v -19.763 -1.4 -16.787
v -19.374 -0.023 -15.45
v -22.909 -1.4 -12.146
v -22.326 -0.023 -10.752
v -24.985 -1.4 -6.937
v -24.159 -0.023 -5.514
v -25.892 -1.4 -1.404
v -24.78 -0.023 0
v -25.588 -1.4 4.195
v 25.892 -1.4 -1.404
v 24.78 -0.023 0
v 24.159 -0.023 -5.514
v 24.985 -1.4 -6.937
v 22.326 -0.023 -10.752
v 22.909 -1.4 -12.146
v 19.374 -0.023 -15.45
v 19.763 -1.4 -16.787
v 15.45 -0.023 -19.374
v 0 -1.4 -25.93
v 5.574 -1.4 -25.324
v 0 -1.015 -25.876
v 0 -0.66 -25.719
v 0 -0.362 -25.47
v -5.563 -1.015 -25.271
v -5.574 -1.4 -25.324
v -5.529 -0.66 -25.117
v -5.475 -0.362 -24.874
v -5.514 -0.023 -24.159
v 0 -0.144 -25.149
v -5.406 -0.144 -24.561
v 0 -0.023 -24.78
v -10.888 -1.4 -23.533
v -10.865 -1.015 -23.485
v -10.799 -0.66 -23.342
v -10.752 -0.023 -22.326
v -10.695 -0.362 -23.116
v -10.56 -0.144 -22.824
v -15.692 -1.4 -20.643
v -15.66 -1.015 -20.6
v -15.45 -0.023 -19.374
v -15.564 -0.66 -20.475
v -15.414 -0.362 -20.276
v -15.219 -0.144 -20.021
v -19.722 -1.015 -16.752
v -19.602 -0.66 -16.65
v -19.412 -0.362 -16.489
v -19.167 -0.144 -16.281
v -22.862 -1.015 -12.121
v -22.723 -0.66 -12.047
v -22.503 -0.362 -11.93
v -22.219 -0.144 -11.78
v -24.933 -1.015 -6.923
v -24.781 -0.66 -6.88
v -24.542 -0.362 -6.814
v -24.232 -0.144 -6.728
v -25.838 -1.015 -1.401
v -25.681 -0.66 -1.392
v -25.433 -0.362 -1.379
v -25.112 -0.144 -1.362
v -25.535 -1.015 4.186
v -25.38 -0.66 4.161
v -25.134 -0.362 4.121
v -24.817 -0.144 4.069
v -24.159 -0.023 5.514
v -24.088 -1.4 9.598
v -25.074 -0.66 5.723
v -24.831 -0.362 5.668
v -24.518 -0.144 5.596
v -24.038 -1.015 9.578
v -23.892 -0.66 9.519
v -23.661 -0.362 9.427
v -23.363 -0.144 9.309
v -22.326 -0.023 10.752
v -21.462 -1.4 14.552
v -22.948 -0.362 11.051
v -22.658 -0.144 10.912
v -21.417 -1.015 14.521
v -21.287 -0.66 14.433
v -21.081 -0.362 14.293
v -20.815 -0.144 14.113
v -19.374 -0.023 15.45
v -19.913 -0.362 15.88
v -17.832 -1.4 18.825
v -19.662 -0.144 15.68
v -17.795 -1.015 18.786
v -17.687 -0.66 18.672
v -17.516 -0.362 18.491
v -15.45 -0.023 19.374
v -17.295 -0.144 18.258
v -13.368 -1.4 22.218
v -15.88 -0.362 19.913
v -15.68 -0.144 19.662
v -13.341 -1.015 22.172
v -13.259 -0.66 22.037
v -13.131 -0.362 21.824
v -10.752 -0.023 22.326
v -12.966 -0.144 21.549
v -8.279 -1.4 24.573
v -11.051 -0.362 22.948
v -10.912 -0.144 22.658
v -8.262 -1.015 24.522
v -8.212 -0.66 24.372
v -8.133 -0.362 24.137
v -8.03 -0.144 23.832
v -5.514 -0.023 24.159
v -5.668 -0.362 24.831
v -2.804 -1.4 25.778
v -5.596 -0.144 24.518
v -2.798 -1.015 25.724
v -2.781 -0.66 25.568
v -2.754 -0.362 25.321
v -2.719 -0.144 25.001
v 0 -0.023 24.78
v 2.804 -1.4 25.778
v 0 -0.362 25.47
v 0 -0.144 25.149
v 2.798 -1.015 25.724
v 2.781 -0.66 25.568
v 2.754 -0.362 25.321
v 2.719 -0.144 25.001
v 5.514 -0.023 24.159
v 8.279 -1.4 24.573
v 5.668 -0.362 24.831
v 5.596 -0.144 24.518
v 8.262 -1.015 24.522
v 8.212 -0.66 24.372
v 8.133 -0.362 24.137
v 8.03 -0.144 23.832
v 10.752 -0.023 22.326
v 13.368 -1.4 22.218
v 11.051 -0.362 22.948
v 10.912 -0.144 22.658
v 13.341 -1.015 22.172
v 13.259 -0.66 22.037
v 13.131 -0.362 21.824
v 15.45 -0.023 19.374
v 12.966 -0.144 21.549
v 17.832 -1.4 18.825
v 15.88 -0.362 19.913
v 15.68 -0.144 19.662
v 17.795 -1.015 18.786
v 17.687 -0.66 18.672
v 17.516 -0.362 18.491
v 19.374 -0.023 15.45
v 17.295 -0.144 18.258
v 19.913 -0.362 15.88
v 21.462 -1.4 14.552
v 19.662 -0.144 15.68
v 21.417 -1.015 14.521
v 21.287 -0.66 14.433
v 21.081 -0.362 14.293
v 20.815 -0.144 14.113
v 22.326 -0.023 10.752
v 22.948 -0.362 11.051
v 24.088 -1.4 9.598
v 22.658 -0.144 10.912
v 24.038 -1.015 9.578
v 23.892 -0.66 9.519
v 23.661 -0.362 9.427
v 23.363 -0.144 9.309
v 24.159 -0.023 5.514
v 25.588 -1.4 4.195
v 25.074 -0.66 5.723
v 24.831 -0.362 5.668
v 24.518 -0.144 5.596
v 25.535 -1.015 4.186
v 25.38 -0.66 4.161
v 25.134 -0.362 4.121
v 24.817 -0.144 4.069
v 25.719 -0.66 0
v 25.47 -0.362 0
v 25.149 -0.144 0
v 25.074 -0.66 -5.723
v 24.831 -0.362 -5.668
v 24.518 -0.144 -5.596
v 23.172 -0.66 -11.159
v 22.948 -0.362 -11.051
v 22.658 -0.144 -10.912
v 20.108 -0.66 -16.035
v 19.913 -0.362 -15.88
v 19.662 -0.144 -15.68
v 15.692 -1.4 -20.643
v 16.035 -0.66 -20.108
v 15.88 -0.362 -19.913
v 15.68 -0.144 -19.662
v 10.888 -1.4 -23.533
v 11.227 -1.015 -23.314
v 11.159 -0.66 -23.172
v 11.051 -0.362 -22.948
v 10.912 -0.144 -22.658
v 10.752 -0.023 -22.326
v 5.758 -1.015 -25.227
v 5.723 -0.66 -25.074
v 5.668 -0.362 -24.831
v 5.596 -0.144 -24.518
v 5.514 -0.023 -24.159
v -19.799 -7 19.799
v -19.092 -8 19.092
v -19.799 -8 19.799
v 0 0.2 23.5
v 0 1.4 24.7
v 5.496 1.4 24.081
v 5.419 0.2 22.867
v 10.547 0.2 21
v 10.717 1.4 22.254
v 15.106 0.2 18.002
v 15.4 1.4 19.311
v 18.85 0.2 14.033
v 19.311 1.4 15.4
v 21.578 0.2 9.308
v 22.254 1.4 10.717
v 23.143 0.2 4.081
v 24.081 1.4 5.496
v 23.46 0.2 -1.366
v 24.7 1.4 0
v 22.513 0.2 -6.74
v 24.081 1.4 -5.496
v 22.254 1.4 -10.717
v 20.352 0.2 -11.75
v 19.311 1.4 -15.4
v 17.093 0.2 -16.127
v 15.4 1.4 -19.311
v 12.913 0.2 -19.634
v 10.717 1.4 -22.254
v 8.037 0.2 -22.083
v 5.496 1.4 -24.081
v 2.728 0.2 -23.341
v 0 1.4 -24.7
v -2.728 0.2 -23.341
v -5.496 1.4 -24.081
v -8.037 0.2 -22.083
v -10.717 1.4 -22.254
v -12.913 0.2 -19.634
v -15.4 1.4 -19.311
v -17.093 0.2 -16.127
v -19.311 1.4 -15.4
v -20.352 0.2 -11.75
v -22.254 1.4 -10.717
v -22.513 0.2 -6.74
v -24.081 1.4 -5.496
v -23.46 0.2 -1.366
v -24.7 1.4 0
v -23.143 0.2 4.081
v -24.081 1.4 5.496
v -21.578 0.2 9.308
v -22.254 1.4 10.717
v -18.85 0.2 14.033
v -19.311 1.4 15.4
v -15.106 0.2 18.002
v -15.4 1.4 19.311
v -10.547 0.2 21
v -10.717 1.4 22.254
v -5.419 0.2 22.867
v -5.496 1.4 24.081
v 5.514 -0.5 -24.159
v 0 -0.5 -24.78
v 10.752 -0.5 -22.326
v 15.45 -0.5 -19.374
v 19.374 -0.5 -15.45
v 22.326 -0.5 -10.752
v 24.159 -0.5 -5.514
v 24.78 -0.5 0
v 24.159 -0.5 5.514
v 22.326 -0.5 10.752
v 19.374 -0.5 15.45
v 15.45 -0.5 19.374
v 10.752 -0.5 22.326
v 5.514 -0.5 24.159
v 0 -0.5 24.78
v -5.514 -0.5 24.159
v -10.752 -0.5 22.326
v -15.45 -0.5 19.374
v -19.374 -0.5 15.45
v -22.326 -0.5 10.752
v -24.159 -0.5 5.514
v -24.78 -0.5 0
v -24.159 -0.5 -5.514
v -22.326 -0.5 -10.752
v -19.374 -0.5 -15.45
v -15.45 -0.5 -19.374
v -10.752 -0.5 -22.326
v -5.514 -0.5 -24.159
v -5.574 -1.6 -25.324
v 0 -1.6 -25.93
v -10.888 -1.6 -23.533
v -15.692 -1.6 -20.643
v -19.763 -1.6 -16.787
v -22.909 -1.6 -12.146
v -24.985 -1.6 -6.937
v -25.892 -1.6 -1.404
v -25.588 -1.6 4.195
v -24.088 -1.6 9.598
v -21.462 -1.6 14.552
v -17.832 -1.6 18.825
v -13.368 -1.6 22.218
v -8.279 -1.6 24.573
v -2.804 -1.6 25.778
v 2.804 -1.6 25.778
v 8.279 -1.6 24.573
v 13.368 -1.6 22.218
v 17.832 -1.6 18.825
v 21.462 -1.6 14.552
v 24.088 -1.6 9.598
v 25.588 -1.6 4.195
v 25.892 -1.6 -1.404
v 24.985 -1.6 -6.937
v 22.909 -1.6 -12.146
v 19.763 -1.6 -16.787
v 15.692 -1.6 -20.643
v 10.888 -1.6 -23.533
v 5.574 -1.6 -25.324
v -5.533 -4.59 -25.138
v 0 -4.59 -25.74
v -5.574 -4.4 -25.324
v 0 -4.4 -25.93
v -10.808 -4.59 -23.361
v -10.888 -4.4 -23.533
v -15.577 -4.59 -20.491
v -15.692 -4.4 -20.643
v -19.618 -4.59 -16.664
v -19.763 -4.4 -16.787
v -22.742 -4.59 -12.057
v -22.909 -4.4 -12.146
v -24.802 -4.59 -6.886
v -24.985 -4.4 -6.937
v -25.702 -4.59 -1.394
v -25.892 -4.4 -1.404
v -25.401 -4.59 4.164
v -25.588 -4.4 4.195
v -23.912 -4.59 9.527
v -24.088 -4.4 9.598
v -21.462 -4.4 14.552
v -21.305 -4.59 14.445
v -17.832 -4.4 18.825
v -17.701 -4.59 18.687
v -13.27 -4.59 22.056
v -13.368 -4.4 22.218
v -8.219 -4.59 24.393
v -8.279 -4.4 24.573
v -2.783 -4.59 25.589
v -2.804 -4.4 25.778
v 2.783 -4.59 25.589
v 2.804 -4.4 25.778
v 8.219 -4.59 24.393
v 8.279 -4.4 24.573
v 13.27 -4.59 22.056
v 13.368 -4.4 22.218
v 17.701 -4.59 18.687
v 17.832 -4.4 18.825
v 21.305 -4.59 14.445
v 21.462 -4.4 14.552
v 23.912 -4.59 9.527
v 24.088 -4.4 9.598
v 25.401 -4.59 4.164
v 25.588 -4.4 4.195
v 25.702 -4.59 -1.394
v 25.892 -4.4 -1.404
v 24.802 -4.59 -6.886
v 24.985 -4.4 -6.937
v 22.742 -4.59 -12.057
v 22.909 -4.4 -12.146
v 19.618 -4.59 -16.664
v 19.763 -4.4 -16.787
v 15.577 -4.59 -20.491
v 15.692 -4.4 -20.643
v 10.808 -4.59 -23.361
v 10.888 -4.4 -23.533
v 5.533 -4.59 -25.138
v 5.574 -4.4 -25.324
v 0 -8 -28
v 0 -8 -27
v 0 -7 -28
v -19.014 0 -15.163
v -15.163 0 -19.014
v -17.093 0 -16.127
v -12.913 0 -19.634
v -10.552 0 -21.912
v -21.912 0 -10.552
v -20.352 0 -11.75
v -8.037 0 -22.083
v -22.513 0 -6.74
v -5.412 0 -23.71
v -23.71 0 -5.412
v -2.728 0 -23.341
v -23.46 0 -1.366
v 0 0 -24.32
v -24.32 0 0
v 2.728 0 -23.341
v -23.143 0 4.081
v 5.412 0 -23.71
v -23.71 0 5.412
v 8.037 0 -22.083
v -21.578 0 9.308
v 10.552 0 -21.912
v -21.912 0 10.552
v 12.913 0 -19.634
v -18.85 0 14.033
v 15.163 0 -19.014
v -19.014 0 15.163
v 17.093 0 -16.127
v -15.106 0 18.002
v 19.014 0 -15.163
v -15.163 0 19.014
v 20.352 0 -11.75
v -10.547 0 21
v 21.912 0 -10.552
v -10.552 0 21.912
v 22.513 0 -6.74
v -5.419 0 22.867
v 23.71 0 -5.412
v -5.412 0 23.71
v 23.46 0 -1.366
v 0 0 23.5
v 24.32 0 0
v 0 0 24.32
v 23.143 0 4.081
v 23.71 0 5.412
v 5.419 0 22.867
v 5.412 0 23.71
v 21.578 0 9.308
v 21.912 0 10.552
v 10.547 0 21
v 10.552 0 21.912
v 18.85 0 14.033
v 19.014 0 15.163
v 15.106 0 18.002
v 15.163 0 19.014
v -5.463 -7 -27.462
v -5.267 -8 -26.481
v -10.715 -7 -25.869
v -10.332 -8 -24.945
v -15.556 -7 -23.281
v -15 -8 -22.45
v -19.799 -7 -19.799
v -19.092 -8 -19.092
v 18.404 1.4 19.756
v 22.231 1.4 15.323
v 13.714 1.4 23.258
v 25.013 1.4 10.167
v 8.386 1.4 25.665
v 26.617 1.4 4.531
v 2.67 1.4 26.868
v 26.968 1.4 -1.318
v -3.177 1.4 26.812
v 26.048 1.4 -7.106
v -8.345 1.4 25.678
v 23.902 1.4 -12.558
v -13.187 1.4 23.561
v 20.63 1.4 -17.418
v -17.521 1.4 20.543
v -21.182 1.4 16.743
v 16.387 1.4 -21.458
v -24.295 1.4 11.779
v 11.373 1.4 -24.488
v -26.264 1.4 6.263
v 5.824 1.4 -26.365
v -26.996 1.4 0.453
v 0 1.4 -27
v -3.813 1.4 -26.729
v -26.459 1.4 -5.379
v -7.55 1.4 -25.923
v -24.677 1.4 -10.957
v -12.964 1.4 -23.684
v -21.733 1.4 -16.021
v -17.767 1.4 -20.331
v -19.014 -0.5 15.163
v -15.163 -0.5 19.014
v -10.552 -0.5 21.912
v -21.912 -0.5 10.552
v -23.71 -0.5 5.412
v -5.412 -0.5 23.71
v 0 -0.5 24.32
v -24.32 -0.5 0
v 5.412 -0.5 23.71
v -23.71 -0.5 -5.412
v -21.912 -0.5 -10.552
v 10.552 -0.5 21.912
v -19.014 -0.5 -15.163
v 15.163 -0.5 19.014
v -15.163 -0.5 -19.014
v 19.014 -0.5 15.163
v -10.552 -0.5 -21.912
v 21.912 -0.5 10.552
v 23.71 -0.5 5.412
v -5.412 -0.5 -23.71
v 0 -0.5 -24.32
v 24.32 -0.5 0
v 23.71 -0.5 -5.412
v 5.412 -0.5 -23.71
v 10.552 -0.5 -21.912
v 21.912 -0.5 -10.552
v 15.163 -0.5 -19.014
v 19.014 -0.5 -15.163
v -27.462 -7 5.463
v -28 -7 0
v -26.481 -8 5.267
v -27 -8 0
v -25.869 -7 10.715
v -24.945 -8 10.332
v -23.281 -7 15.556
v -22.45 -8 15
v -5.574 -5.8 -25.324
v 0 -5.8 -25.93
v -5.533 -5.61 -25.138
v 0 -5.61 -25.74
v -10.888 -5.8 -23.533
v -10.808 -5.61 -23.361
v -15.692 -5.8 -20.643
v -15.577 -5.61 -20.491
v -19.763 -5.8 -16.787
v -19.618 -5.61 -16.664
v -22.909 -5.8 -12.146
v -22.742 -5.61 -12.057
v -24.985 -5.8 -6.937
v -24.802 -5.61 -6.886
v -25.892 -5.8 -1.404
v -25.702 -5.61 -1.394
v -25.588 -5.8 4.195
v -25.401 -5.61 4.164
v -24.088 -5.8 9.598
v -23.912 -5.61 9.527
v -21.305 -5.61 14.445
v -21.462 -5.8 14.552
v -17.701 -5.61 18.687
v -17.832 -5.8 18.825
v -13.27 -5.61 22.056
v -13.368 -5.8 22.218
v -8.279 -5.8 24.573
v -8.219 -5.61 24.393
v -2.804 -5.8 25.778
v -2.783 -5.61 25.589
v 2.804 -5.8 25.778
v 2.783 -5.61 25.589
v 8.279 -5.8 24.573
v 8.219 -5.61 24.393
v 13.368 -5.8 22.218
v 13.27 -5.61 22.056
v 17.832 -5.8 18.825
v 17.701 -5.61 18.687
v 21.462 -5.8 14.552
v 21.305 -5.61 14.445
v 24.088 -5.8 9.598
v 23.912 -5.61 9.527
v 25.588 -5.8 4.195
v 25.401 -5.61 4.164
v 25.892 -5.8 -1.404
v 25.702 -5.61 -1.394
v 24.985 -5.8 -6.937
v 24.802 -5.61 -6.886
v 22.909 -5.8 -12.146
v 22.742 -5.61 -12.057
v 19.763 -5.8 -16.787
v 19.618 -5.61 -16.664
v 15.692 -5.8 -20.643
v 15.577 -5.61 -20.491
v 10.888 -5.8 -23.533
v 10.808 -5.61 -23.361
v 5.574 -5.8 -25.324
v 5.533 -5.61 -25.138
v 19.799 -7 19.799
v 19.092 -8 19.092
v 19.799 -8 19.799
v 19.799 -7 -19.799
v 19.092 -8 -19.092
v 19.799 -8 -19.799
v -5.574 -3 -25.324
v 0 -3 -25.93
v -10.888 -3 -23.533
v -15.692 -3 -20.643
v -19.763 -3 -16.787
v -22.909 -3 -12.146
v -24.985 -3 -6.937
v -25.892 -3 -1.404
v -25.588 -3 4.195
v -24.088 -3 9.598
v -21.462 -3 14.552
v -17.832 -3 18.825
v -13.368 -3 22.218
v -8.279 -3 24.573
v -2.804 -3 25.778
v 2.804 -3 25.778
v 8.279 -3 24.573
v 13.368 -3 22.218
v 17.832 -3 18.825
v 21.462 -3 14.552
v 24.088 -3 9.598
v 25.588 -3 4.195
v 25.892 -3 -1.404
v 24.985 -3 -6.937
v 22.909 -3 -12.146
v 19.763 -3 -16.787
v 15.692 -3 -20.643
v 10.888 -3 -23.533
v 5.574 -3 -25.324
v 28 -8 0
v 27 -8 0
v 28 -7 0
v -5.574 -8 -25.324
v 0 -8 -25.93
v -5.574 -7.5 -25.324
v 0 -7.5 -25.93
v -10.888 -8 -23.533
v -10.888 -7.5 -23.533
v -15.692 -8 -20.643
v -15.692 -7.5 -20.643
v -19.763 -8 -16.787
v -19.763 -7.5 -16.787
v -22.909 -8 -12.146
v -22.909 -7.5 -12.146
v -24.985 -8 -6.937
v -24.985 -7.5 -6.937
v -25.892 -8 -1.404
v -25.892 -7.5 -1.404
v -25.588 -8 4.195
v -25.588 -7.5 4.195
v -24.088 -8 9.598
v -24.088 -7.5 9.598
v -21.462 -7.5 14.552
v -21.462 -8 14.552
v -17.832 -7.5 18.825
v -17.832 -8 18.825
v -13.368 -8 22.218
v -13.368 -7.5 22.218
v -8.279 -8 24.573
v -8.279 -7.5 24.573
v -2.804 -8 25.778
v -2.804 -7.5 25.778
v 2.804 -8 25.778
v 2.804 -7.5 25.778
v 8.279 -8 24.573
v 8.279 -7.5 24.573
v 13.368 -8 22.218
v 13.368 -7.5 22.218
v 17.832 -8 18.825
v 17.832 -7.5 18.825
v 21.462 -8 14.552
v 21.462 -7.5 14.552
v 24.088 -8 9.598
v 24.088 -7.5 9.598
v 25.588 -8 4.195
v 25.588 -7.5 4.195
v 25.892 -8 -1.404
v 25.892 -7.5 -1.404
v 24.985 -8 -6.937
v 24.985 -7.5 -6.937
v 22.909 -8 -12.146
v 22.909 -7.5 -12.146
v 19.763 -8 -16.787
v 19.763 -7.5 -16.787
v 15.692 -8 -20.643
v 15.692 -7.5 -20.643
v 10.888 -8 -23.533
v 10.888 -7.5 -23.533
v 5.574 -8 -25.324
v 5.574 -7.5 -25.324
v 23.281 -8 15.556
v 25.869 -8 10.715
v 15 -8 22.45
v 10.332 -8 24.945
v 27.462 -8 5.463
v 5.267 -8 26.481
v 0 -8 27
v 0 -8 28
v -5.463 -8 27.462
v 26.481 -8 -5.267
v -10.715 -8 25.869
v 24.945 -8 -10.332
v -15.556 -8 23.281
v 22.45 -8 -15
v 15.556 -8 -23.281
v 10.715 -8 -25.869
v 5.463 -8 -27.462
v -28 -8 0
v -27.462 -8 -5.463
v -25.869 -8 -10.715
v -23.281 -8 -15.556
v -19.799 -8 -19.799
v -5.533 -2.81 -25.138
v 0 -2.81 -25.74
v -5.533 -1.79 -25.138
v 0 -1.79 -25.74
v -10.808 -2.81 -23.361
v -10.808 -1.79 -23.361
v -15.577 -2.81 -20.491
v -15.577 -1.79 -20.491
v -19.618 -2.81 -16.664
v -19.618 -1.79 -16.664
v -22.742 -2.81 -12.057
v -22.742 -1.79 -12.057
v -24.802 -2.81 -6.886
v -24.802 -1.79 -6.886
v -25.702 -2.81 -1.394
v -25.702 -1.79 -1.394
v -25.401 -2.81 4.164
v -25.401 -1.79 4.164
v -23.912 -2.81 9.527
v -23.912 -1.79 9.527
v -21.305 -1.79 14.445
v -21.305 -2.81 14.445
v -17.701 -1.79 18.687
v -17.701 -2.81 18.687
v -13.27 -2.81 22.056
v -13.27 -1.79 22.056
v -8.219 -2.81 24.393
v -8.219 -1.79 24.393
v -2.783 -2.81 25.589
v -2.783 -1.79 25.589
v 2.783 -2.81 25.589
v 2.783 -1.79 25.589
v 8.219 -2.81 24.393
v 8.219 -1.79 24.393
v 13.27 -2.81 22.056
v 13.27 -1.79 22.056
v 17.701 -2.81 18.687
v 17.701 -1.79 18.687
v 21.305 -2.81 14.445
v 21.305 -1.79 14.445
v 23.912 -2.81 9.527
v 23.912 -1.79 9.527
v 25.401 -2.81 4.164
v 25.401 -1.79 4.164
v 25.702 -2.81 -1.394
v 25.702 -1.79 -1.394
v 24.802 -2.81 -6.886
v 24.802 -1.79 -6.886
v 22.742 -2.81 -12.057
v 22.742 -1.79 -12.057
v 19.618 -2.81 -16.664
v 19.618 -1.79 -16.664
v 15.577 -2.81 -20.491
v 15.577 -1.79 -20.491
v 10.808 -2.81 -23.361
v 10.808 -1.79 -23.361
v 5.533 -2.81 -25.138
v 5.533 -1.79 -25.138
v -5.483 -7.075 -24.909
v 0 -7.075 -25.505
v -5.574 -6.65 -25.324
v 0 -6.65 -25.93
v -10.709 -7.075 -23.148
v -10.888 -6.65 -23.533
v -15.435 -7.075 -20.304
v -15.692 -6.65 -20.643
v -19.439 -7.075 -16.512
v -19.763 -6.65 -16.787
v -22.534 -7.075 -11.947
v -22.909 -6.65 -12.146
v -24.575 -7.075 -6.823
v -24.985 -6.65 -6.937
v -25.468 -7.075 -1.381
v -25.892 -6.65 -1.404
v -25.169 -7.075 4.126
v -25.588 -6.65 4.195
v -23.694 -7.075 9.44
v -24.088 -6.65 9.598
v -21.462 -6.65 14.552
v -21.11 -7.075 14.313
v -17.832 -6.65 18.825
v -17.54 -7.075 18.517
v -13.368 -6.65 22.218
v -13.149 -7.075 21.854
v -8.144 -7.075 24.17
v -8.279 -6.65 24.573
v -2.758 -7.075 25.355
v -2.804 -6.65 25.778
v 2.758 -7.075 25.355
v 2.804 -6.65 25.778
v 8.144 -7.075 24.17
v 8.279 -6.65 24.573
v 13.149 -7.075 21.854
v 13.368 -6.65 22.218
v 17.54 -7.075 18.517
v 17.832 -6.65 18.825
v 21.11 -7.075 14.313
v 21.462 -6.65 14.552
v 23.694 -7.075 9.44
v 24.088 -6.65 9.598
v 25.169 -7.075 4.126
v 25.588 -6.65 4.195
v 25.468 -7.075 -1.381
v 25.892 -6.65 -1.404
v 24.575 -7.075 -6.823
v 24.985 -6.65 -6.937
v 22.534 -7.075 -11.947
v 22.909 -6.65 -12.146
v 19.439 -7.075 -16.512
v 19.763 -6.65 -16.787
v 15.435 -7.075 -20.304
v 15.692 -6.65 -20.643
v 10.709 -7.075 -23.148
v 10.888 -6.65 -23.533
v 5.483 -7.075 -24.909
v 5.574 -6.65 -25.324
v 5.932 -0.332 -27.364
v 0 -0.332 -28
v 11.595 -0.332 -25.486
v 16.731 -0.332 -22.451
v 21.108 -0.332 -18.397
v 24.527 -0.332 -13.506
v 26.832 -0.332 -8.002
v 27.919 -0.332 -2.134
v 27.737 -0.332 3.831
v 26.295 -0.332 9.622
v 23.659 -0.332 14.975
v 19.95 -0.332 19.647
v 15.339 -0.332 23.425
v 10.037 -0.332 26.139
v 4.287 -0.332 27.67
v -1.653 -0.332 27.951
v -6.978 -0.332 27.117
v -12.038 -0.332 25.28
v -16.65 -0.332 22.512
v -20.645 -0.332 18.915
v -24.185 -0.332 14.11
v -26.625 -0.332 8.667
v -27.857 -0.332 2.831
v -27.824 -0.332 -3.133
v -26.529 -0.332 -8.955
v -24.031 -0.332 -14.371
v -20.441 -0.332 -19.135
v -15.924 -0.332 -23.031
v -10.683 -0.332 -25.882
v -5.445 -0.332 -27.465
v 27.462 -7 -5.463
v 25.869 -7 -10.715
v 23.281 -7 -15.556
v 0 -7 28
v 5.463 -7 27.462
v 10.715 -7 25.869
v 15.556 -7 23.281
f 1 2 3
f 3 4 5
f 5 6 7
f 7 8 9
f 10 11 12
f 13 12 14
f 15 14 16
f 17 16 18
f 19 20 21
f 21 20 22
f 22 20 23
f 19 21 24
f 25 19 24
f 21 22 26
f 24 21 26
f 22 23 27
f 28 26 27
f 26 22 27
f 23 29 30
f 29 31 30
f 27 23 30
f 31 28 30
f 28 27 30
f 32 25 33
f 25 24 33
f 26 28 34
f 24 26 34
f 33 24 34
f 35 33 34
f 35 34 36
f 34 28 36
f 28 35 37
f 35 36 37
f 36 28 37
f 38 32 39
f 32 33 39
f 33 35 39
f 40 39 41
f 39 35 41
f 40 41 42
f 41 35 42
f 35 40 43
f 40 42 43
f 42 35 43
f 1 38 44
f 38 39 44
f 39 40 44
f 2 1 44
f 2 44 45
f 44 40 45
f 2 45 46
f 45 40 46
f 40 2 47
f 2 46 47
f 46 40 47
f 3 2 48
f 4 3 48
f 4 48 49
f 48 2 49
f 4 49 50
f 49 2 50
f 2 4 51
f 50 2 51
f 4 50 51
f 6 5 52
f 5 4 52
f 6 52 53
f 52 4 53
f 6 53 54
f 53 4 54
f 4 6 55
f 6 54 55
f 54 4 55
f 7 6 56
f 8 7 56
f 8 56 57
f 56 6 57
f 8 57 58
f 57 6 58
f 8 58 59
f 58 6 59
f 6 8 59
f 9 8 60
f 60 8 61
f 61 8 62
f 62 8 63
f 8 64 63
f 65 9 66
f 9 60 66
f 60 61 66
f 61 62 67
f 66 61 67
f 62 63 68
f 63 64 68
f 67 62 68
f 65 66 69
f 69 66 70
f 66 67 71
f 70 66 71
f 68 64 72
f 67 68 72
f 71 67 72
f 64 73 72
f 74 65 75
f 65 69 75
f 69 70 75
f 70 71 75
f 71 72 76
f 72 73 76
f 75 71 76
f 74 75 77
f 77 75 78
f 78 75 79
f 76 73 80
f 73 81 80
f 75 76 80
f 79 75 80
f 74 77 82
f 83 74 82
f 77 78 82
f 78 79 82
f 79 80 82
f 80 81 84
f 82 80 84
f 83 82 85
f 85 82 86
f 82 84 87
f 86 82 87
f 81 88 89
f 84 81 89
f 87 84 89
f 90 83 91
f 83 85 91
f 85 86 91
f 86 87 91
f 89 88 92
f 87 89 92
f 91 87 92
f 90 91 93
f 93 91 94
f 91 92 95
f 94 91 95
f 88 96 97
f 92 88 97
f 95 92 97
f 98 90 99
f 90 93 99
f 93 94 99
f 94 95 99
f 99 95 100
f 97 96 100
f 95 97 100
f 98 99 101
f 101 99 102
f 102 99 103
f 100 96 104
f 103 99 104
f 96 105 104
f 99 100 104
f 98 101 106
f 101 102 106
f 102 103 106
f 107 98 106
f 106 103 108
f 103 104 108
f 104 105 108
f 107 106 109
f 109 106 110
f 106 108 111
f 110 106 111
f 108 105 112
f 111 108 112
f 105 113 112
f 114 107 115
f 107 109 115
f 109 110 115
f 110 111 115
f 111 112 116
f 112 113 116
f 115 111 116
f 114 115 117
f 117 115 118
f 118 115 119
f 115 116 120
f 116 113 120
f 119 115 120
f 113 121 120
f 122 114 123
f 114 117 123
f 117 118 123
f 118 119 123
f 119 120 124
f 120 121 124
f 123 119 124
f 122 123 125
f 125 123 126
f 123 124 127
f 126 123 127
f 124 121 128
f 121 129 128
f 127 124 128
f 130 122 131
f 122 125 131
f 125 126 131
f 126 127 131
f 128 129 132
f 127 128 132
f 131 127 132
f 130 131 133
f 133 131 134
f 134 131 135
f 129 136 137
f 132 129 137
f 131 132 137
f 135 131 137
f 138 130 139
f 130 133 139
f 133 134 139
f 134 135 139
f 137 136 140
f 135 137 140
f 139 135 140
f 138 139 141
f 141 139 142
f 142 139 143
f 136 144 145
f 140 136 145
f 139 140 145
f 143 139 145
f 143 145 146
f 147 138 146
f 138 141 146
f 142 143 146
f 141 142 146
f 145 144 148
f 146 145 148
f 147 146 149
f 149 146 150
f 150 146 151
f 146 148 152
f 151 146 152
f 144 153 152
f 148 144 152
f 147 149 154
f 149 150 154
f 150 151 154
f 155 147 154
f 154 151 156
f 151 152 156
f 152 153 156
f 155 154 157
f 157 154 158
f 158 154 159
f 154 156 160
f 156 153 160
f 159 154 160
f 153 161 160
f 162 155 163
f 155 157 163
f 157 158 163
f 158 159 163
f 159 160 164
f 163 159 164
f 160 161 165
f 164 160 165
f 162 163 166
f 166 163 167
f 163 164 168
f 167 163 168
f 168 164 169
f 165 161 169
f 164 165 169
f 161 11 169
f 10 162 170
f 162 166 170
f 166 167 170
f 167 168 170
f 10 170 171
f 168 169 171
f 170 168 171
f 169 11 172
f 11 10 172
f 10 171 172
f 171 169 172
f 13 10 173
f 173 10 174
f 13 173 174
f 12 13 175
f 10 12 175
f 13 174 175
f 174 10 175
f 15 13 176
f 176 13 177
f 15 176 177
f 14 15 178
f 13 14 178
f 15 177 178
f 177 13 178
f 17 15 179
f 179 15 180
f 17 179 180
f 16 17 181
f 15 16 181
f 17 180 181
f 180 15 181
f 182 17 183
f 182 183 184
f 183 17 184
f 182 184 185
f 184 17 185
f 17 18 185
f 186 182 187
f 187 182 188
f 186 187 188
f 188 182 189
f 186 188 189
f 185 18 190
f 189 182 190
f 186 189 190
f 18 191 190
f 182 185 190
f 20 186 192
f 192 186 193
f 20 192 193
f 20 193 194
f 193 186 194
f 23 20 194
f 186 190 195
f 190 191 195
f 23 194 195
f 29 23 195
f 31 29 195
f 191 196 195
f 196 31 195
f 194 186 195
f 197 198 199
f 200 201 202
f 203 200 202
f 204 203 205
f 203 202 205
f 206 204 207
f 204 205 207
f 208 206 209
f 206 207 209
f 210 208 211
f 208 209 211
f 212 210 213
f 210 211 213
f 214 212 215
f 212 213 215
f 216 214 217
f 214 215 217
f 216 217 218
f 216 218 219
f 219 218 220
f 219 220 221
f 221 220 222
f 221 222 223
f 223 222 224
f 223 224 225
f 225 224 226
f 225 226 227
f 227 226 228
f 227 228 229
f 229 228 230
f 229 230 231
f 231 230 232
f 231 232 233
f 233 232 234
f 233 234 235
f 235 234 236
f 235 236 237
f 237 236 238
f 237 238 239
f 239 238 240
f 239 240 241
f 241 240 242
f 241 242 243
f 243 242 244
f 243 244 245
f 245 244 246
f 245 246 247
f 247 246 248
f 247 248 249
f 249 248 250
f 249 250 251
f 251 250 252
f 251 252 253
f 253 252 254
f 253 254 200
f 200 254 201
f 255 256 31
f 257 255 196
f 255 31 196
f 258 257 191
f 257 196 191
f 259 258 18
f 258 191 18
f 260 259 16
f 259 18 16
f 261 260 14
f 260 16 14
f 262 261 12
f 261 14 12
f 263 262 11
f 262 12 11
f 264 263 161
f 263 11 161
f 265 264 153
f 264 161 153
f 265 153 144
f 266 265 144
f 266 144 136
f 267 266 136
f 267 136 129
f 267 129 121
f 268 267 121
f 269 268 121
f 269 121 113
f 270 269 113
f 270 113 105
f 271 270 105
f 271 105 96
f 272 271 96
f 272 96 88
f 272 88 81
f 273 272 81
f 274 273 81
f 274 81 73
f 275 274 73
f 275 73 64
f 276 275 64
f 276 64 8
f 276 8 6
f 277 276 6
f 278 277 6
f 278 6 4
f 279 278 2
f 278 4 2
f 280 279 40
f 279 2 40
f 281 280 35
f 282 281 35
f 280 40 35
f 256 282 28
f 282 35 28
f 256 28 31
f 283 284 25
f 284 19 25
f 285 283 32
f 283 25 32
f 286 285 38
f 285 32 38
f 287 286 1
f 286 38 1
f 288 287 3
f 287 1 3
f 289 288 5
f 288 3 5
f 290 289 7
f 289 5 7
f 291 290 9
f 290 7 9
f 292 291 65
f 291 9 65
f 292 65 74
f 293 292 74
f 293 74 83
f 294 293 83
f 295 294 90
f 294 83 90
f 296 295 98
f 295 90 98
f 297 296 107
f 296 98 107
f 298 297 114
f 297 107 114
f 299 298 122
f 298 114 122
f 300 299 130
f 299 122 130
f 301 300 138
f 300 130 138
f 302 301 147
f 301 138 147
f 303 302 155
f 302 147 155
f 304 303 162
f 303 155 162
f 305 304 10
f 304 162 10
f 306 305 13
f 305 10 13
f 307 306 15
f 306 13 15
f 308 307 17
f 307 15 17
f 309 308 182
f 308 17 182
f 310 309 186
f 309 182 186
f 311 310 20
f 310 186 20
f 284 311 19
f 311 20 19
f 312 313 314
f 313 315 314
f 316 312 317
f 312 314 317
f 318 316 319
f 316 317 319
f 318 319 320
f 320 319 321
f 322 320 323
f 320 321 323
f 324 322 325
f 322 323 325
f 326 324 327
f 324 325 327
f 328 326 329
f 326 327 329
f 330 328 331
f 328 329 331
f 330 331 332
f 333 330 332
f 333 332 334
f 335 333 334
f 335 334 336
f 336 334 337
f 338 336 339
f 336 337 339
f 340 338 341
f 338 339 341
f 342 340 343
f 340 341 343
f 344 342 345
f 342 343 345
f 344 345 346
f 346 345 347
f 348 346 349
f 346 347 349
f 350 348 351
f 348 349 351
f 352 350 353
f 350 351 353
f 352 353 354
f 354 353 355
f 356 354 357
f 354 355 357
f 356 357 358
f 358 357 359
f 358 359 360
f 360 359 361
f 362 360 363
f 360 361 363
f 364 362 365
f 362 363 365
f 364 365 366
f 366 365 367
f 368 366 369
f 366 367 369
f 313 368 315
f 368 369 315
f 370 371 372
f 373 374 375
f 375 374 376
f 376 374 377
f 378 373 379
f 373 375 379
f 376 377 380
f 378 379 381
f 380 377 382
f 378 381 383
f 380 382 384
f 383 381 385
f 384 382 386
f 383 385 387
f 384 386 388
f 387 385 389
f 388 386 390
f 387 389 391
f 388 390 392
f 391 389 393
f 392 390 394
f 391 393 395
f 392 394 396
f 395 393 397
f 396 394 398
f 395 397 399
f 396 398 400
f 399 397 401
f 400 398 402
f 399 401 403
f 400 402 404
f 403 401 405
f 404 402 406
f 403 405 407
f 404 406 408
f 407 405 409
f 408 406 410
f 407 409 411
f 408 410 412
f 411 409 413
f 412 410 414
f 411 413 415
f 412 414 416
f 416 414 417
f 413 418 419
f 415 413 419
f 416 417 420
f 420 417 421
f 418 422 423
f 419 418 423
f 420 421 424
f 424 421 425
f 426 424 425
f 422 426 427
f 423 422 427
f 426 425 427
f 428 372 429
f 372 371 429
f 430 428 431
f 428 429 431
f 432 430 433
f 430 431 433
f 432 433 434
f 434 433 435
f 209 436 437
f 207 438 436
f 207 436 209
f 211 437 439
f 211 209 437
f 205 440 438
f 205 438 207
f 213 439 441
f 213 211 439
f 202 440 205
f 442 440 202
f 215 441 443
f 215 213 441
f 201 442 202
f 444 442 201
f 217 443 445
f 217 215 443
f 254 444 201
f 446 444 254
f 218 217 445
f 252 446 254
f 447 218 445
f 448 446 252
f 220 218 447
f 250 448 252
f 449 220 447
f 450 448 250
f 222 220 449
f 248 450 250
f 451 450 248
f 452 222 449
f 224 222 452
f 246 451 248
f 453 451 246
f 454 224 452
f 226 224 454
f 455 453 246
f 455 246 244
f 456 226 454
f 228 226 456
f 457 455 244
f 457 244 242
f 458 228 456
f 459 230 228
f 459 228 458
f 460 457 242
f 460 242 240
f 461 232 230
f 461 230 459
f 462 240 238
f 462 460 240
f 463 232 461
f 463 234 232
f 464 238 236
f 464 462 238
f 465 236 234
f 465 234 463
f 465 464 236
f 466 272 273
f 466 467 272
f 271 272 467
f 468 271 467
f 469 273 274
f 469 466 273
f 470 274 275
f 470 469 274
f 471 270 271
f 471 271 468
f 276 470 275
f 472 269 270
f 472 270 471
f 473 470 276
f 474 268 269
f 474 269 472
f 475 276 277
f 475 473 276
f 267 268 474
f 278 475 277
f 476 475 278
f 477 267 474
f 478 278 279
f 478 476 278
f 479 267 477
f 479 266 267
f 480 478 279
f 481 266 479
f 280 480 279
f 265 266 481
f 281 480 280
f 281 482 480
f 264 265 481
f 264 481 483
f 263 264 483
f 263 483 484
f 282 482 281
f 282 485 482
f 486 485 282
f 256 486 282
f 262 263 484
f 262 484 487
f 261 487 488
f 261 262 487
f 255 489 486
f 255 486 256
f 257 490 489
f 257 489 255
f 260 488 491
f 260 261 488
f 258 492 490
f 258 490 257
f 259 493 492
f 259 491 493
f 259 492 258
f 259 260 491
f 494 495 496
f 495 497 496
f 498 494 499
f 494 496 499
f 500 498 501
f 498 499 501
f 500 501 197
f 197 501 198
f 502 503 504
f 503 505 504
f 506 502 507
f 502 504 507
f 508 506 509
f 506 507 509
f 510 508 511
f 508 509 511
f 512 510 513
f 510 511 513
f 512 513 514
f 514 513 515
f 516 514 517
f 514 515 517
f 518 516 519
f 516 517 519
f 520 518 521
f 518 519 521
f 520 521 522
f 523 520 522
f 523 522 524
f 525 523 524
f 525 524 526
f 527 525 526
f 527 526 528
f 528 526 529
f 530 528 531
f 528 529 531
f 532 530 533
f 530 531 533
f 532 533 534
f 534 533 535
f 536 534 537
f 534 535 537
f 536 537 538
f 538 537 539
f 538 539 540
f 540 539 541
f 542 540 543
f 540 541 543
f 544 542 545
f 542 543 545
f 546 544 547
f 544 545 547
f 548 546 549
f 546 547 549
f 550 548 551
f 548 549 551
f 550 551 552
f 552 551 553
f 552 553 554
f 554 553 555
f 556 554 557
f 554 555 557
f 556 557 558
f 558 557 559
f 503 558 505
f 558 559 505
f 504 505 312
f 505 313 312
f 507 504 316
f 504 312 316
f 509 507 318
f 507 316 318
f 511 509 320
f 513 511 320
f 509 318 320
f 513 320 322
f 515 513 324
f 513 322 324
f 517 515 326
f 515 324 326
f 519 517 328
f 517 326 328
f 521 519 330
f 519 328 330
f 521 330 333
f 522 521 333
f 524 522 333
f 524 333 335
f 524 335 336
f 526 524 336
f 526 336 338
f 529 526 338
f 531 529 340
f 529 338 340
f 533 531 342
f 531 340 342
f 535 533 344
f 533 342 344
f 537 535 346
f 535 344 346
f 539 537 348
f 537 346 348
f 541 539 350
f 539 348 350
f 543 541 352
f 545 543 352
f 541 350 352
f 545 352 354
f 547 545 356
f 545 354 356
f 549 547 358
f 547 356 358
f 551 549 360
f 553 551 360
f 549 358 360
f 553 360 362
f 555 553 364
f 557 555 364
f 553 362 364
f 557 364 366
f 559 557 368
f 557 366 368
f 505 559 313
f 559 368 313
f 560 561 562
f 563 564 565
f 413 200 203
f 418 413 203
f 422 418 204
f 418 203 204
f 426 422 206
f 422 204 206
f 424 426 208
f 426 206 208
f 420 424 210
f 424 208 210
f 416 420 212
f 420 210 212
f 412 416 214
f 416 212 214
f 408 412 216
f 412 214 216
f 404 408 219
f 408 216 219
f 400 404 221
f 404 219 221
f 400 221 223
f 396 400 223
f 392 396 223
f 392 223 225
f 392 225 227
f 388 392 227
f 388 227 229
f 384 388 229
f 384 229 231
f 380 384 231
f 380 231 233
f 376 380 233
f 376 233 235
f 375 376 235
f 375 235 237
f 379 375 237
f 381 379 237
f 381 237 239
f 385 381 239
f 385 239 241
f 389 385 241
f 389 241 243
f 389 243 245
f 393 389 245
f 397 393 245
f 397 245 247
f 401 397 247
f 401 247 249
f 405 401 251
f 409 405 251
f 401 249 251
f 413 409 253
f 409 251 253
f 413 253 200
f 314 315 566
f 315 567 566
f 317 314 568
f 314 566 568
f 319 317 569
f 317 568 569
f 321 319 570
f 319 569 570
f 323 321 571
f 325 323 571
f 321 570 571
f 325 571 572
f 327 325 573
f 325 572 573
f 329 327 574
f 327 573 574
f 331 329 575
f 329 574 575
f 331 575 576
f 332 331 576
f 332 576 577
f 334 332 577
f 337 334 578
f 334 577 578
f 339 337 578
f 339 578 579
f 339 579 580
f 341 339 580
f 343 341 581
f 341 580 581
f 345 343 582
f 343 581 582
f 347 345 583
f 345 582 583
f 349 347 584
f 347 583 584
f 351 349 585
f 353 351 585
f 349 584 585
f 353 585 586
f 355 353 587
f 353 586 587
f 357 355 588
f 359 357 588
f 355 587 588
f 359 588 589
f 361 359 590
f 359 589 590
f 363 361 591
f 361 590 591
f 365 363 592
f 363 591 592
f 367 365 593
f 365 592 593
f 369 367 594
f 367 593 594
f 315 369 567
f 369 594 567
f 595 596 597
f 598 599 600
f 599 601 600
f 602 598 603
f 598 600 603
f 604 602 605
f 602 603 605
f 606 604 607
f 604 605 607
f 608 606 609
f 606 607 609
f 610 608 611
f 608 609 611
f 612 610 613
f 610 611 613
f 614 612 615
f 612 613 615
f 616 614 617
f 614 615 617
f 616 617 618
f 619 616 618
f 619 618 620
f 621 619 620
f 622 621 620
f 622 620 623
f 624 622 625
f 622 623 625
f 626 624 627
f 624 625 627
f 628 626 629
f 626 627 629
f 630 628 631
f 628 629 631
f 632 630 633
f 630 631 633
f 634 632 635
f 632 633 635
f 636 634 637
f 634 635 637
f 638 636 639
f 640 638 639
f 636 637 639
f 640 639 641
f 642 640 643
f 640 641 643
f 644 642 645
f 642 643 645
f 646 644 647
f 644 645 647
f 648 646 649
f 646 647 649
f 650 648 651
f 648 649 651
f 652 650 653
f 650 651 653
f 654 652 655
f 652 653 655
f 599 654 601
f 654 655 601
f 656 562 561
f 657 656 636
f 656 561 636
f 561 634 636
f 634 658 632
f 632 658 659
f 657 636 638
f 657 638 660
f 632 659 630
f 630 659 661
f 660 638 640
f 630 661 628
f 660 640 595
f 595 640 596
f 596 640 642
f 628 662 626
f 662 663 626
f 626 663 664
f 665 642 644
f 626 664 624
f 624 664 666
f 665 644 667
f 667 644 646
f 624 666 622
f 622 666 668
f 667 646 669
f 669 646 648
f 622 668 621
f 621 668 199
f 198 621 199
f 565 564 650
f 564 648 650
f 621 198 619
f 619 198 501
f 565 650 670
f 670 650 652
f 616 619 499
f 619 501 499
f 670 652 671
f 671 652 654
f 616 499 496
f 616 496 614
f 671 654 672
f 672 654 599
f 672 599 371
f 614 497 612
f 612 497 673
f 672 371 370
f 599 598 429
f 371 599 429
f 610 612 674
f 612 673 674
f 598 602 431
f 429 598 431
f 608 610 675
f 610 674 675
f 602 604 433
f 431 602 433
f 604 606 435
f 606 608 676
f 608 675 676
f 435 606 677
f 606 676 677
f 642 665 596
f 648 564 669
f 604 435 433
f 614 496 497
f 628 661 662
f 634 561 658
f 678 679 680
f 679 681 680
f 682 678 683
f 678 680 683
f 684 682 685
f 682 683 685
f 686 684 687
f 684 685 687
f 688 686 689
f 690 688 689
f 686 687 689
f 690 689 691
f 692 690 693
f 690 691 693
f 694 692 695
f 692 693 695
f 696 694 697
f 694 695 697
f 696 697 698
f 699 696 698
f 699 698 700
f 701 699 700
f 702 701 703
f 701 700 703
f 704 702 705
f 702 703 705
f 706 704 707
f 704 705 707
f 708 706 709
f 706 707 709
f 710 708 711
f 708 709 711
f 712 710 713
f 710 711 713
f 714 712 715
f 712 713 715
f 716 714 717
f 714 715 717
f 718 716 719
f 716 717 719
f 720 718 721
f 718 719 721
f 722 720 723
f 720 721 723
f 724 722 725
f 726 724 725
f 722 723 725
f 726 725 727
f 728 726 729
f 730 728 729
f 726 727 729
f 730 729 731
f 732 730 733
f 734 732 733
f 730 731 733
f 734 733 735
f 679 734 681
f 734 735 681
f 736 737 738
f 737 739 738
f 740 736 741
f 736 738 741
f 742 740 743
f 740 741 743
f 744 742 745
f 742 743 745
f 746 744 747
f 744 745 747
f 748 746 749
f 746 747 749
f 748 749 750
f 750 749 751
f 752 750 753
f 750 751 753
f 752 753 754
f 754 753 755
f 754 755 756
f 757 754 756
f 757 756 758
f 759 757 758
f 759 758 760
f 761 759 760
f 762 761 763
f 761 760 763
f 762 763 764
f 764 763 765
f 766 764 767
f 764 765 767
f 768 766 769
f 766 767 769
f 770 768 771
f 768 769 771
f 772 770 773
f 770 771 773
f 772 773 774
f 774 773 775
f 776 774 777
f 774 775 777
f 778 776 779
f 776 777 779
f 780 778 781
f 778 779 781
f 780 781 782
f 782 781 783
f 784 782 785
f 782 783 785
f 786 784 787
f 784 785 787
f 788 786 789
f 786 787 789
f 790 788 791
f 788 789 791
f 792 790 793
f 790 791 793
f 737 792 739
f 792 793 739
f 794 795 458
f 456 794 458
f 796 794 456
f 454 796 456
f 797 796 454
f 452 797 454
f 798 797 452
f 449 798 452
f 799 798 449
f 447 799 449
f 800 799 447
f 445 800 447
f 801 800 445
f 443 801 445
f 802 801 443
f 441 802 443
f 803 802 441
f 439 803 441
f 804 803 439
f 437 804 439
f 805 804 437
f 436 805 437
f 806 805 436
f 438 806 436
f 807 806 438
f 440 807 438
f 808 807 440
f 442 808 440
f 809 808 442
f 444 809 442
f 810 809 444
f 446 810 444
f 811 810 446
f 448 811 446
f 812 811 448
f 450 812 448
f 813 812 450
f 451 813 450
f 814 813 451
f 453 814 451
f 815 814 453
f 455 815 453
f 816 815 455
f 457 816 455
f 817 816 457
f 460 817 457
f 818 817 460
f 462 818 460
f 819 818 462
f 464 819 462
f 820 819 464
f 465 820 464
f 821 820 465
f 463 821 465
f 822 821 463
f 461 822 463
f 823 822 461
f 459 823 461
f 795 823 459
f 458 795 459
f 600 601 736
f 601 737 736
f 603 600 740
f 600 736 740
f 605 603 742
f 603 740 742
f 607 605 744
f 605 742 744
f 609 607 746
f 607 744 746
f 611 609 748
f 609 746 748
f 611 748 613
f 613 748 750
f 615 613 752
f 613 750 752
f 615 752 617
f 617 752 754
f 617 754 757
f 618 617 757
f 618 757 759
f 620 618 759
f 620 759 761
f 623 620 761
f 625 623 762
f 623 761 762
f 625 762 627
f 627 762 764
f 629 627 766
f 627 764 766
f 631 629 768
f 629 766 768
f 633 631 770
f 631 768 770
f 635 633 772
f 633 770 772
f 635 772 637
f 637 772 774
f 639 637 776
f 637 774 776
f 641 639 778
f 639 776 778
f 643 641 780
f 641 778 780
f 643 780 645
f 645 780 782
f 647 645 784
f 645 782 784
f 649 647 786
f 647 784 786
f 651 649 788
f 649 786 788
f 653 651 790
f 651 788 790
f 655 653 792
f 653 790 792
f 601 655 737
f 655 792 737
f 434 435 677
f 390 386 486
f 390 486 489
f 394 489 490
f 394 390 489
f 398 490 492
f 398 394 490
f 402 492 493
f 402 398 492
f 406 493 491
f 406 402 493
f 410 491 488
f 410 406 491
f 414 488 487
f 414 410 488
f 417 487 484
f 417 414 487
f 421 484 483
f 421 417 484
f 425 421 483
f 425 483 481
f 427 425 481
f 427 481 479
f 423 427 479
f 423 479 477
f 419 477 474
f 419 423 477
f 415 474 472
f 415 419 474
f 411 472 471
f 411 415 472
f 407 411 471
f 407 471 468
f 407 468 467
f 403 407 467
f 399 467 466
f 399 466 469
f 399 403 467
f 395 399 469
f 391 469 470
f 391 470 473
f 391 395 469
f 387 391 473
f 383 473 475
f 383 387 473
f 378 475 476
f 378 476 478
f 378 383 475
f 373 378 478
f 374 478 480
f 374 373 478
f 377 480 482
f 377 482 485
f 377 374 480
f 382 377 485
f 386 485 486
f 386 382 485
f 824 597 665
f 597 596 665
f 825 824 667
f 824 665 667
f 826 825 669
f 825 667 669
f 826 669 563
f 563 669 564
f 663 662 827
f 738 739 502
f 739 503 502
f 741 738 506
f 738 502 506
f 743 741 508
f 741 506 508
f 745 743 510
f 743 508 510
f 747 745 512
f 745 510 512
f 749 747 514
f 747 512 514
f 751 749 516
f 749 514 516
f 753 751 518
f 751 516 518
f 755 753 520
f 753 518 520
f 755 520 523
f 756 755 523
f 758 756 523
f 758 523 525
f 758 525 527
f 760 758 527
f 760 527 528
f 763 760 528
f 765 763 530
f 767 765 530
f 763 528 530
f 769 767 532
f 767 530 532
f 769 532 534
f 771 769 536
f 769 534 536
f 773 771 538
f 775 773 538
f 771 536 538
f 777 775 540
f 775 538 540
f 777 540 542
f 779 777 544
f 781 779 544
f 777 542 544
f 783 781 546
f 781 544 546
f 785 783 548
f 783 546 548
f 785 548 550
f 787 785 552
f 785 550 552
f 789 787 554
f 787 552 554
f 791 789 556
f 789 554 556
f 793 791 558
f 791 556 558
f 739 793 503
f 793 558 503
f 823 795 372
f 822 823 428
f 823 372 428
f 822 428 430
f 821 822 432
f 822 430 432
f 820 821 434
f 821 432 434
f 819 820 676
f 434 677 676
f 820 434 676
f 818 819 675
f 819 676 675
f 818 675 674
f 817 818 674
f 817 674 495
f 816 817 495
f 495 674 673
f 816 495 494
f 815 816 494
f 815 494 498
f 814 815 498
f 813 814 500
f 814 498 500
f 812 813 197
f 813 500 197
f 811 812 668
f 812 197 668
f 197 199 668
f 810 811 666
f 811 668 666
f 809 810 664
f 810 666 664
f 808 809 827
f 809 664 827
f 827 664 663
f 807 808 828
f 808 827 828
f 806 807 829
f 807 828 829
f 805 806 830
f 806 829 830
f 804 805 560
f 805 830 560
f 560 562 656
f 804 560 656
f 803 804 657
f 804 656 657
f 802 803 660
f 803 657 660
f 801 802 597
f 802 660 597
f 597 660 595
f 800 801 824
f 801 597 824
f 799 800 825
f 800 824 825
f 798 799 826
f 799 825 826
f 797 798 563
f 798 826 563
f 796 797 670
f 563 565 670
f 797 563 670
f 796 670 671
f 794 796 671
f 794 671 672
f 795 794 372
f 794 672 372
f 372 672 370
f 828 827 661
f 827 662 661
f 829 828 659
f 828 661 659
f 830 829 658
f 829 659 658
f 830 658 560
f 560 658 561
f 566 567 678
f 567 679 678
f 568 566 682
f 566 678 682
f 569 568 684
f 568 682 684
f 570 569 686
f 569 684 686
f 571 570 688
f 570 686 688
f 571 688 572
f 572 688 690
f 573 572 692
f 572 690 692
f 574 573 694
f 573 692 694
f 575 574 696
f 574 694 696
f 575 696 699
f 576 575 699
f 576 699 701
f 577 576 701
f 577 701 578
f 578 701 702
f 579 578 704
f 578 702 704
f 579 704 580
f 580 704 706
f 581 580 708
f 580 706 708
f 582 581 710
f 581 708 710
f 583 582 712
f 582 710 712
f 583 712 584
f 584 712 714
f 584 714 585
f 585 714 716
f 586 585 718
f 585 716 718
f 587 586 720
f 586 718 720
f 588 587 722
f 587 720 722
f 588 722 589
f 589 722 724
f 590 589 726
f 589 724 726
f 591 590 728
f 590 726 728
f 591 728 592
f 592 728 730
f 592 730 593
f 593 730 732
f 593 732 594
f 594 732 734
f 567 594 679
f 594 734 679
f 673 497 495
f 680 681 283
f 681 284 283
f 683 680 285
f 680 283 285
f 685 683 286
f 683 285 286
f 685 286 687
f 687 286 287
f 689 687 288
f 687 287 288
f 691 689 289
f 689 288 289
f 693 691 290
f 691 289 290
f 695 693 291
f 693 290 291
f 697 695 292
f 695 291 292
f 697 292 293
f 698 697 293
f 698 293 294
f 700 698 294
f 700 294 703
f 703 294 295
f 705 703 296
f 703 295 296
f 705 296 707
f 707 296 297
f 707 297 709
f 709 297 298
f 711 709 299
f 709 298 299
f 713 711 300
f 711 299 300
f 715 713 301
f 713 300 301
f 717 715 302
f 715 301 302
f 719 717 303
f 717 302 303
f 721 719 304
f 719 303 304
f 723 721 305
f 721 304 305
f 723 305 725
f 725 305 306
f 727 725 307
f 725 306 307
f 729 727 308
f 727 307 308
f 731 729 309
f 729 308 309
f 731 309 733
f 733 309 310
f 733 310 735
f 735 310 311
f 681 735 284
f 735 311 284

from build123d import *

# Parameters (mm, degrees)
SKETCH_1_R               = 28
EXTRUDE_1_DEPTH          = 2
SKETCH_4_R               = 23.5
CUT_EXTRUDE_1_DEPTH      = 41.841155713
CUT_EXTRUDE_START        = -0.6
SKETCH_5_R               = 28
CUT_EXTRUDE_2_DEPTH      = 0.6
CHAMFER_1_SIZE           = 1.2
CHAMFER_2_SIZE           = 1.732
CHAMFER_2_SIZE2          = 0.999970666
CUT_REVOLVE_1_ANGLE      = 45
PATTERN_CIRCULAR_1_COUNT = 4
SKETCH_8_R               = 24.78
SKETCH_8_R_2             = 24.32
EXTRUDE_2_DEPTH          = 0.5


with BuildPart() as part:
    # 草图1 → 凸台-拉伸1 (new body)
    with BuildSketch(Plane(origin=(0, 0, 0), x_dir=(1, 0, 0), z_dir=(0, 1, 0))):
        with Locations(Location((0, 0, 0), (0, 0, 270))):
            Circle(SKETCH_1_R)
    extrude(amount=EXTRUDE_1_DEPTH)

    # 草图2 → 旋转1 (revolve)
    with BuildSketch(Plane(origin=(0, 0, 0), x_dir=(-0.9702957262759954, 0, -0.24192189559967248), z_dir=(0.24192189559967245, 0, -0.9702957262759953)), mode=Mode.PRIVATE) as revolve_1_sk:
        with BuildLine():
            Line((25.93, -8), (25.93, -7.5))
            Line((25.93, -7.5), (25.505, -7.075))
            Line((25.505, -7.075), (25.93, -6.65))
            Line((25.93, -6.65), (25.93, -5.8))
            Line((25.93, -5.8), (25.74, -5.61))
            Line((25.74, -5.61), (25.74, -4.59))
            Line((25.74, -4.59), (25.93, -4.4))
            Line((25.93, -4.4), (25.93, -3))
            Line((25.93, -3), (25.74, -2.81))
            Line((25.74, -2.81), (25.74, -1.79))
            Line((25.74, -1.79), (25.93, -1.6))
            Line((25.93, -1.6), (25.93, -1.4))
            ThreePointArc((25.93, -1.4), (25.519949494, -0.410050506), (24.53, 0))
            Line((24.53, 0), (28, 0))
            Line((28, 0), (28, -8))
            Line((28, -8), (25.93, -8))
        make_face()
    revolve(revolve_1_sk.sketch.rotate(Axis((0, 0, 0), (0, 1, 0)), 284), axis=Axis((0, 0, 0), (0, 1, 0)))

    # 草图4 → 切除-拉伸1 (cut, through all)
    with BuildSketch(Plane(origin=(0, 2, 0), x_dir=(1, 0, 0), z_dir=(0, 1, 0))):
        with Locations(Location((0, 0, 0), (0, 0, 270))):
            Circle(SKETCH_4_R)
    extrude(amount=-CUT_EXTRUDE_1_DEPTH, mode=Mode.SUBTRACT)

    # 草图5 → 切除-拉伸2 (cut)
    with BuildSketch(Plane(origin=(0, 2, 0), x_dir=(1, 0, 0), z_dir=(0, 1, 0)).offset(CUT_EXTRUDE_START)):
        with Locations(Location((0, 0, 0), (0, 0, 90))):
            Circle(SKETCH_5_R)
    extrude(amount=CUT_EXTRUDE_2_DEPTH, mode=Mode.SUBTRACT)

    # 倒角1
    chamfer_1_edges = [part.edges().sort_by_distance(p)[0] for p in [
        (0, 1.4, -23.5),
    ]]
    chamfer(chamfer_1_edges, length=CHAMFER_1_SIZE)

    # 倒角2
    chamfer_2_edges = [part.edges().sort_by_distance(p)[0] for p in [
        (0, 1.4, -28),
    ]]
    chamfer_2_side = [part.faces().sort_by_distance(p)[0] for p in [
        (0, 0.7, -28),
    ]]
    chamfer(chamfer_2_edges, length=CHAMFER_2_SIZE, length2=CHAMFER_2_SIZE2, reference=chamfer_2_side[0])

    # 草图7 → 切除-旋转1 (revolve, cut)
    with BuildSketch(Plane.XY):
        Polygon((28, -8), (28, -7), (27, -8), align=None)
    cut_revolve_1 = revolve(axis=Axis((0, 0, 0), (0, 1, 0)), revolution_arc=CUT_REVOLVE_1_ANGLE, mode=Mode.SUBTRACT)

    # 阵列(圆周)1: 切除-旋转1 ×4 about axis
    pattern_circular_1_axis = Axis((0, 0, 0), (0, 1, 0))
    for i in range(1, PATTERN_CIRCULAR_1_COUNT):
        add(cut_revolve_1.rotate(pattern_circular_1_axis, i * 360 / PATTERN_CIRCULAR_1_COUNT), mode=Mode.SUBTRACT)

    # 草图8 → 凸台-拉伸2 (add)
    with BuildSketch(Plane.XZ):
        with Locations(Location((0, 0, 0), (0, 0, 270))):
            Circle(SKETCH_8_R)
        with Locations(Location((0, 0, 0), (0, 0, 270))):
            Circle(SKETCH_8_R_2, mode=Mode.SUBTRACT)
    extrude(amount=EXTRUDE_2_DEPTH)


solid = part.part
